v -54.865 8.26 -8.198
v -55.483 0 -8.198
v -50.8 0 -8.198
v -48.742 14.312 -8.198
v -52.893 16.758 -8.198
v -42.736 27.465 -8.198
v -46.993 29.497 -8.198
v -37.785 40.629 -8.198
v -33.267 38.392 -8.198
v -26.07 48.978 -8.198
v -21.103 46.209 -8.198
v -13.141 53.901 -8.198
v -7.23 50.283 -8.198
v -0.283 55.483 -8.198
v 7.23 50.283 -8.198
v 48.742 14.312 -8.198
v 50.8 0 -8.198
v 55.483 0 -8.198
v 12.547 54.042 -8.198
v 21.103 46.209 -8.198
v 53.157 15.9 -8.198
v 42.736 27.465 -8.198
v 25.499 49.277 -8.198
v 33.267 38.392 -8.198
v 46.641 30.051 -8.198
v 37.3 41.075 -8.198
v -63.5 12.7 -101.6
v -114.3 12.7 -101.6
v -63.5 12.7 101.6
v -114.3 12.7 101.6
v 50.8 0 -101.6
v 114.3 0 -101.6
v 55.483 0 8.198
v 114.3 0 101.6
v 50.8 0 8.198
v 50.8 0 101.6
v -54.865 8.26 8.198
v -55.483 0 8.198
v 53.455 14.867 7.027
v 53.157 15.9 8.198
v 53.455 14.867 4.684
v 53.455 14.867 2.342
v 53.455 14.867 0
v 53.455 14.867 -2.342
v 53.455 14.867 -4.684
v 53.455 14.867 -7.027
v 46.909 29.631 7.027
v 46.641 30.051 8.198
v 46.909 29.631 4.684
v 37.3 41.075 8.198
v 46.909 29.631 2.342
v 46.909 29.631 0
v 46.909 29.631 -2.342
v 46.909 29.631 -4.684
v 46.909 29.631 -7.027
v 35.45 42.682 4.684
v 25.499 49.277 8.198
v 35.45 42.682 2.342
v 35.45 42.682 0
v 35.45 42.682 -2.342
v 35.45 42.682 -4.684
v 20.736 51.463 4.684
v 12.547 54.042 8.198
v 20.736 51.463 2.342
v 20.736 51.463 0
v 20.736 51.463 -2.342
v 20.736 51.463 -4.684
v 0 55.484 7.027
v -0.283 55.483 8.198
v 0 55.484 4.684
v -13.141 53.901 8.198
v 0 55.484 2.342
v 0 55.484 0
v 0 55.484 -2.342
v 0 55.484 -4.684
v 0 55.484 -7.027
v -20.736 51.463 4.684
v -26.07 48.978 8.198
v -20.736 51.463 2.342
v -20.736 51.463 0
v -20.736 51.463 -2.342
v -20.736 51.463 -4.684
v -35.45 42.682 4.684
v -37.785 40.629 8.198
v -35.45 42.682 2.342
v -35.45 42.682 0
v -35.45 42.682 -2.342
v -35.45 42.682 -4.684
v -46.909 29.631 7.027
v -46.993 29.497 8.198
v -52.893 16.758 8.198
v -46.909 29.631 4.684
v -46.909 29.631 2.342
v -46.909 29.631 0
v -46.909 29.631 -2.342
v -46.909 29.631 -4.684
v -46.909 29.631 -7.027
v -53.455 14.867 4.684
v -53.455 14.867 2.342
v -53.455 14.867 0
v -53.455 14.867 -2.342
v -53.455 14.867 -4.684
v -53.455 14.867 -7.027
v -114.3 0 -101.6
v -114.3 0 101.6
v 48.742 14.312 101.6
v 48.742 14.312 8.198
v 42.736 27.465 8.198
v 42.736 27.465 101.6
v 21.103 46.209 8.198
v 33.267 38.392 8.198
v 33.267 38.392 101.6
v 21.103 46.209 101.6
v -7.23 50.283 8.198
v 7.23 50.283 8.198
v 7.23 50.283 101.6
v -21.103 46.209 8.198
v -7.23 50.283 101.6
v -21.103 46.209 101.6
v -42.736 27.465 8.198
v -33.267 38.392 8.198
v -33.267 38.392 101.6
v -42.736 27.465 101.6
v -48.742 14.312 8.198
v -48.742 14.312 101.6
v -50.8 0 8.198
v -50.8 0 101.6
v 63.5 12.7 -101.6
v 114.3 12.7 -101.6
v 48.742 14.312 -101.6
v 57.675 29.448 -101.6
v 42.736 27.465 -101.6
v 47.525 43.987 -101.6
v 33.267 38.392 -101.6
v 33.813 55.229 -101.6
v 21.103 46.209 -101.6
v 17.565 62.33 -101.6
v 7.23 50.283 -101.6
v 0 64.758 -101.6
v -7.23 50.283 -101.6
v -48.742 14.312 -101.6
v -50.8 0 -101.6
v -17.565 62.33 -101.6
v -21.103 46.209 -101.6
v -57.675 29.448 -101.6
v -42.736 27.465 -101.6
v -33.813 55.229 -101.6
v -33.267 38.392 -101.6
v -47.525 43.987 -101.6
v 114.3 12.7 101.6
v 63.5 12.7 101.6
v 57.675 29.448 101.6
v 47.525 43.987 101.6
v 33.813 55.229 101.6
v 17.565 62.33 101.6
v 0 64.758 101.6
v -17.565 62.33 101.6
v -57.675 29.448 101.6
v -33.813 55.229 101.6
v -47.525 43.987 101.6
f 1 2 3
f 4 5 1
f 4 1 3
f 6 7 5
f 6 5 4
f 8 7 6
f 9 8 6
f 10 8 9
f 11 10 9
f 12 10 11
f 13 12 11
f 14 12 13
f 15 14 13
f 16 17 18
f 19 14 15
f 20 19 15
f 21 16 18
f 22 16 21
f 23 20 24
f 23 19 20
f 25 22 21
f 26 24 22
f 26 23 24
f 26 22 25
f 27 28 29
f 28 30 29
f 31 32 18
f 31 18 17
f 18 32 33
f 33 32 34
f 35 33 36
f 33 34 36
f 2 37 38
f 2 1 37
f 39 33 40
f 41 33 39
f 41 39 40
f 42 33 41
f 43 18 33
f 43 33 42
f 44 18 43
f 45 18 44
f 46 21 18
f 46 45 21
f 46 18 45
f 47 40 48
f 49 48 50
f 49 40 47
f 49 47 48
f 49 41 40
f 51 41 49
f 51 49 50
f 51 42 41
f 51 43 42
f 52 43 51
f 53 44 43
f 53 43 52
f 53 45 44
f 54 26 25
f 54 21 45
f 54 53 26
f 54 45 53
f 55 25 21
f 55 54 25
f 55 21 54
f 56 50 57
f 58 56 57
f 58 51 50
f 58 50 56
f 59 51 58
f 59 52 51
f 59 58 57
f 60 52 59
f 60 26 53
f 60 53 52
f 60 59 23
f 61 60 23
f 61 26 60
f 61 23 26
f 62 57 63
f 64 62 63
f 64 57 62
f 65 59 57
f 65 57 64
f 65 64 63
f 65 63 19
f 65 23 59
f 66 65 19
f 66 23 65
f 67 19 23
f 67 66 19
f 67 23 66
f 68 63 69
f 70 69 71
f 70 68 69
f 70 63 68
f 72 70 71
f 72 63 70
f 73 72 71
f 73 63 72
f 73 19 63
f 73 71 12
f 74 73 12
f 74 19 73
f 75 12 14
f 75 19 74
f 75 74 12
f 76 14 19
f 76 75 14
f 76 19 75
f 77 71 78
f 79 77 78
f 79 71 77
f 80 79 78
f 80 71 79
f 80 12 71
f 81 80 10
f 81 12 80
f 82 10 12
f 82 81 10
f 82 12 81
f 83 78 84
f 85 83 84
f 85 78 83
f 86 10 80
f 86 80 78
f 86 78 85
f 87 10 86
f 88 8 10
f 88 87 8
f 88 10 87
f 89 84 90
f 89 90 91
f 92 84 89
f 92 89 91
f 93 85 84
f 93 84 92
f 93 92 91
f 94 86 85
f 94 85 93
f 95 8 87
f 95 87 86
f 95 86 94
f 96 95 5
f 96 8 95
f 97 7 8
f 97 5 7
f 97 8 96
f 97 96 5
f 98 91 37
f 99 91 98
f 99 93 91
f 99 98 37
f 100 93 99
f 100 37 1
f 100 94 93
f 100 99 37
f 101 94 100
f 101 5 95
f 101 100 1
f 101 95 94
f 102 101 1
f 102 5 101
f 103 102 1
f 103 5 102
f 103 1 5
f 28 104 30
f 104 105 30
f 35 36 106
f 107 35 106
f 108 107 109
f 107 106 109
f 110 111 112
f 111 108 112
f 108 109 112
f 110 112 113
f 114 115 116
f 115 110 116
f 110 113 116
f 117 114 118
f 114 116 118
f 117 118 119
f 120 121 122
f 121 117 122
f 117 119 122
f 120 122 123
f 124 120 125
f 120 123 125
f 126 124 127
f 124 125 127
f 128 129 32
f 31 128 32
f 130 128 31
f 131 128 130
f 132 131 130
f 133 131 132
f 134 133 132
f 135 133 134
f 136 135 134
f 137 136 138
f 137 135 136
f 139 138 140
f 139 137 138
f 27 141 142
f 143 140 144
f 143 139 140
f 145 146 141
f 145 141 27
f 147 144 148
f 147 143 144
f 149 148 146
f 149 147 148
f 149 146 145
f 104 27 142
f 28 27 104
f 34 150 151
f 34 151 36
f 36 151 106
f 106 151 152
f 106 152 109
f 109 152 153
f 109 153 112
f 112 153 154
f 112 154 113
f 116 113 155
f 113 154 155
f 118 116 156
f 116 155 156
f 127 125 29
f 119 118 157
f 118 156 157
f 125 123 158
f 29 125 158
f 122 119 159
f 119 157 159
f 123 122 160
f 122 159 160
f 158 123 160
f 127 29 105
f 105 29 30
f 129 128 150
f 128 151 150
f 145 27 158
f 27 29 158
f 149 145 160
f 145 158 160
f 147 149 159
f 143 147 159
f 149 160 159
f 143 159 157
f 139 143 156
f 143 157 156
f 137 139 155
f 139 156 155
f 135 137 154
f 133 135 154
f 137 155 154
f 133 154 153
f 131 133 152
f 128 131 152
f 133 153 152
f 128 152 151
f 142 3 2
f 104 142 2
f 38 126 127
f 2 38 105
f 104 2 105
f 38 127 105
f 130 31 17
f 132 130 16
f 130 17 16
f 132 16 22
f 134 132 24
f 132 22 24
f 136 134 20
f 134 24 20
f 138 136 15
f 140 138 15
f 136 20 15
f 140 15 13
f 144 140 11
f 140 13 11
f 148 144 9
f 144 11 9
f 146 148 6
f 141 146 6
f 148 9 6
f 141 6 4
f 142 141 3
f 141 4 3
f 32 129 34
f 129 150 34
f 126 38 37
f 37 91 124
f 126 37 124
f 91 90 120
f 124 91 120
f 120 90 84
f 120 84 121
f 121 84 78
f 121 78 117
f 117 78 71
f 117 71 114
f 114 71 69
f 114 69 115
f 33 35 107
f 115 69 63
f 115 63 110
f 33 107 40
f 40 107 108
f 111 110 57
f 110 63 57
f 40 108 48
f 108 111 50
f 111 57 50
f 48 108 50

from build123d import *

# Parameters (mm, degrees)
BOSS_EXTRUDE2_DEPTH = 101.6
CUT_SWEEP2_START    = -8.197626231
CUT_SWEEP2_DEPTH    = 16.395252462


# Read off the part's stored shape, not the designer's step: Cut-Sweep2
with BuildPart() as part:
    # Sketch1 → Boss-Extrude2 (new, symmetric)
    with BuildSketch(Plane.XY):
        with BuildLine():
            Line((-50.8, 0), (-114.3, 0))
            Line((-114.3, 0), (-114.3, 12.7))
            Line((-114.3, 12.7), (-63.5, 12.7))
            ThreePointArc((-63.5, 12.7), (0, 64.757547823), (63.5, 12.7))
            Line((63.5, 12.7), (114.3, 12.7))
            Line((114.3, 12.7), (114.3, 0))
            Line((114.3, 0), (50.8, 0))
            ThreePointArc((50.8, 0), (0, 50.8), (-50.8, 0))
        make_face()
    extrude(amount=BOSS_EXTRUDE2_DEPTH, both=True)

    # Cut-Sweep2 outline → Cut-Sweep2 (cut)
    with BuildSketch(Plane.XY.offset(CUT_SWEEP2_START)):
        with BuildLine():
            Line((50.8, 0), (55.482597318, 0))
            add(Edge.make_bspline(
                [(55.482597318, 0), (55.479494195, 2.91415368), (55.255178285, 5.917770975), (54.175303072, 12.490458413), (53.25997788, 15.990881145), (50.641228247, 22.973888147), (48.970431753, 26.367184551), (44.847073202, 32.894857639), (42.443468127, 35.946208717), (37.009145884, 41.519887141), (34.016276899, 44.003484644), (27.57622226, 48.300783556), (24.203765584, 50.065786815), (13.800838479, 54.25746412), (6.656772523, 55.483587394), (-6.656785579, 55.483587394), (-13.800859436, 54.257459266), (-24.203789489, 50.065775387), (-27.576245764, 48.3007701), (-34.016297572, 44.003468622), (-37.009164361, 41.519870489), (-42.443481596, 35.946192603), (-44.847084096, 32.894842463), (-48.970437832, 26.367172857), (-50.64123252, 22.973878319), (-53.259979362, 15.990875624), (-54.175303836, 12.490454657), (-55.255178301, 5.917770093), (-55.47949419, 2.914153473), (-55.482597317, 0)],
                knots=[0.007470969, 0.007470969, 0.007470969, 0.007470969, 0.062499939, 0.062499939, 0.124999877, 0.124999877, 0.187499816, 0.187499816, 0.249999755, 0.249999755, 0.312499694, 0.312499694, 0.374999632, 0.374999632, 0.49999951, 0.49999951, 0.624999632, 0.624999632, 0.687499694, 0.687499694, 0.749999755, 0.749999755, 0.812499816, 0.812499816, 0.874999877, 0.874999877, 0.937499939, 0.937499939, 0.992529016, 0.992529016, 0.992529016, 0.992529016], degree=3))
            Line((-55.482597317, 0), (-50.8, 0))
            ThreePointArc((-50.8, 0), (0, 50.8), (50.8, 0))
        make_face()
    extrude(amount=CUT_SWEEP2_DEPTH, mode=Mode.SUBTRACT)


solid = part.part
